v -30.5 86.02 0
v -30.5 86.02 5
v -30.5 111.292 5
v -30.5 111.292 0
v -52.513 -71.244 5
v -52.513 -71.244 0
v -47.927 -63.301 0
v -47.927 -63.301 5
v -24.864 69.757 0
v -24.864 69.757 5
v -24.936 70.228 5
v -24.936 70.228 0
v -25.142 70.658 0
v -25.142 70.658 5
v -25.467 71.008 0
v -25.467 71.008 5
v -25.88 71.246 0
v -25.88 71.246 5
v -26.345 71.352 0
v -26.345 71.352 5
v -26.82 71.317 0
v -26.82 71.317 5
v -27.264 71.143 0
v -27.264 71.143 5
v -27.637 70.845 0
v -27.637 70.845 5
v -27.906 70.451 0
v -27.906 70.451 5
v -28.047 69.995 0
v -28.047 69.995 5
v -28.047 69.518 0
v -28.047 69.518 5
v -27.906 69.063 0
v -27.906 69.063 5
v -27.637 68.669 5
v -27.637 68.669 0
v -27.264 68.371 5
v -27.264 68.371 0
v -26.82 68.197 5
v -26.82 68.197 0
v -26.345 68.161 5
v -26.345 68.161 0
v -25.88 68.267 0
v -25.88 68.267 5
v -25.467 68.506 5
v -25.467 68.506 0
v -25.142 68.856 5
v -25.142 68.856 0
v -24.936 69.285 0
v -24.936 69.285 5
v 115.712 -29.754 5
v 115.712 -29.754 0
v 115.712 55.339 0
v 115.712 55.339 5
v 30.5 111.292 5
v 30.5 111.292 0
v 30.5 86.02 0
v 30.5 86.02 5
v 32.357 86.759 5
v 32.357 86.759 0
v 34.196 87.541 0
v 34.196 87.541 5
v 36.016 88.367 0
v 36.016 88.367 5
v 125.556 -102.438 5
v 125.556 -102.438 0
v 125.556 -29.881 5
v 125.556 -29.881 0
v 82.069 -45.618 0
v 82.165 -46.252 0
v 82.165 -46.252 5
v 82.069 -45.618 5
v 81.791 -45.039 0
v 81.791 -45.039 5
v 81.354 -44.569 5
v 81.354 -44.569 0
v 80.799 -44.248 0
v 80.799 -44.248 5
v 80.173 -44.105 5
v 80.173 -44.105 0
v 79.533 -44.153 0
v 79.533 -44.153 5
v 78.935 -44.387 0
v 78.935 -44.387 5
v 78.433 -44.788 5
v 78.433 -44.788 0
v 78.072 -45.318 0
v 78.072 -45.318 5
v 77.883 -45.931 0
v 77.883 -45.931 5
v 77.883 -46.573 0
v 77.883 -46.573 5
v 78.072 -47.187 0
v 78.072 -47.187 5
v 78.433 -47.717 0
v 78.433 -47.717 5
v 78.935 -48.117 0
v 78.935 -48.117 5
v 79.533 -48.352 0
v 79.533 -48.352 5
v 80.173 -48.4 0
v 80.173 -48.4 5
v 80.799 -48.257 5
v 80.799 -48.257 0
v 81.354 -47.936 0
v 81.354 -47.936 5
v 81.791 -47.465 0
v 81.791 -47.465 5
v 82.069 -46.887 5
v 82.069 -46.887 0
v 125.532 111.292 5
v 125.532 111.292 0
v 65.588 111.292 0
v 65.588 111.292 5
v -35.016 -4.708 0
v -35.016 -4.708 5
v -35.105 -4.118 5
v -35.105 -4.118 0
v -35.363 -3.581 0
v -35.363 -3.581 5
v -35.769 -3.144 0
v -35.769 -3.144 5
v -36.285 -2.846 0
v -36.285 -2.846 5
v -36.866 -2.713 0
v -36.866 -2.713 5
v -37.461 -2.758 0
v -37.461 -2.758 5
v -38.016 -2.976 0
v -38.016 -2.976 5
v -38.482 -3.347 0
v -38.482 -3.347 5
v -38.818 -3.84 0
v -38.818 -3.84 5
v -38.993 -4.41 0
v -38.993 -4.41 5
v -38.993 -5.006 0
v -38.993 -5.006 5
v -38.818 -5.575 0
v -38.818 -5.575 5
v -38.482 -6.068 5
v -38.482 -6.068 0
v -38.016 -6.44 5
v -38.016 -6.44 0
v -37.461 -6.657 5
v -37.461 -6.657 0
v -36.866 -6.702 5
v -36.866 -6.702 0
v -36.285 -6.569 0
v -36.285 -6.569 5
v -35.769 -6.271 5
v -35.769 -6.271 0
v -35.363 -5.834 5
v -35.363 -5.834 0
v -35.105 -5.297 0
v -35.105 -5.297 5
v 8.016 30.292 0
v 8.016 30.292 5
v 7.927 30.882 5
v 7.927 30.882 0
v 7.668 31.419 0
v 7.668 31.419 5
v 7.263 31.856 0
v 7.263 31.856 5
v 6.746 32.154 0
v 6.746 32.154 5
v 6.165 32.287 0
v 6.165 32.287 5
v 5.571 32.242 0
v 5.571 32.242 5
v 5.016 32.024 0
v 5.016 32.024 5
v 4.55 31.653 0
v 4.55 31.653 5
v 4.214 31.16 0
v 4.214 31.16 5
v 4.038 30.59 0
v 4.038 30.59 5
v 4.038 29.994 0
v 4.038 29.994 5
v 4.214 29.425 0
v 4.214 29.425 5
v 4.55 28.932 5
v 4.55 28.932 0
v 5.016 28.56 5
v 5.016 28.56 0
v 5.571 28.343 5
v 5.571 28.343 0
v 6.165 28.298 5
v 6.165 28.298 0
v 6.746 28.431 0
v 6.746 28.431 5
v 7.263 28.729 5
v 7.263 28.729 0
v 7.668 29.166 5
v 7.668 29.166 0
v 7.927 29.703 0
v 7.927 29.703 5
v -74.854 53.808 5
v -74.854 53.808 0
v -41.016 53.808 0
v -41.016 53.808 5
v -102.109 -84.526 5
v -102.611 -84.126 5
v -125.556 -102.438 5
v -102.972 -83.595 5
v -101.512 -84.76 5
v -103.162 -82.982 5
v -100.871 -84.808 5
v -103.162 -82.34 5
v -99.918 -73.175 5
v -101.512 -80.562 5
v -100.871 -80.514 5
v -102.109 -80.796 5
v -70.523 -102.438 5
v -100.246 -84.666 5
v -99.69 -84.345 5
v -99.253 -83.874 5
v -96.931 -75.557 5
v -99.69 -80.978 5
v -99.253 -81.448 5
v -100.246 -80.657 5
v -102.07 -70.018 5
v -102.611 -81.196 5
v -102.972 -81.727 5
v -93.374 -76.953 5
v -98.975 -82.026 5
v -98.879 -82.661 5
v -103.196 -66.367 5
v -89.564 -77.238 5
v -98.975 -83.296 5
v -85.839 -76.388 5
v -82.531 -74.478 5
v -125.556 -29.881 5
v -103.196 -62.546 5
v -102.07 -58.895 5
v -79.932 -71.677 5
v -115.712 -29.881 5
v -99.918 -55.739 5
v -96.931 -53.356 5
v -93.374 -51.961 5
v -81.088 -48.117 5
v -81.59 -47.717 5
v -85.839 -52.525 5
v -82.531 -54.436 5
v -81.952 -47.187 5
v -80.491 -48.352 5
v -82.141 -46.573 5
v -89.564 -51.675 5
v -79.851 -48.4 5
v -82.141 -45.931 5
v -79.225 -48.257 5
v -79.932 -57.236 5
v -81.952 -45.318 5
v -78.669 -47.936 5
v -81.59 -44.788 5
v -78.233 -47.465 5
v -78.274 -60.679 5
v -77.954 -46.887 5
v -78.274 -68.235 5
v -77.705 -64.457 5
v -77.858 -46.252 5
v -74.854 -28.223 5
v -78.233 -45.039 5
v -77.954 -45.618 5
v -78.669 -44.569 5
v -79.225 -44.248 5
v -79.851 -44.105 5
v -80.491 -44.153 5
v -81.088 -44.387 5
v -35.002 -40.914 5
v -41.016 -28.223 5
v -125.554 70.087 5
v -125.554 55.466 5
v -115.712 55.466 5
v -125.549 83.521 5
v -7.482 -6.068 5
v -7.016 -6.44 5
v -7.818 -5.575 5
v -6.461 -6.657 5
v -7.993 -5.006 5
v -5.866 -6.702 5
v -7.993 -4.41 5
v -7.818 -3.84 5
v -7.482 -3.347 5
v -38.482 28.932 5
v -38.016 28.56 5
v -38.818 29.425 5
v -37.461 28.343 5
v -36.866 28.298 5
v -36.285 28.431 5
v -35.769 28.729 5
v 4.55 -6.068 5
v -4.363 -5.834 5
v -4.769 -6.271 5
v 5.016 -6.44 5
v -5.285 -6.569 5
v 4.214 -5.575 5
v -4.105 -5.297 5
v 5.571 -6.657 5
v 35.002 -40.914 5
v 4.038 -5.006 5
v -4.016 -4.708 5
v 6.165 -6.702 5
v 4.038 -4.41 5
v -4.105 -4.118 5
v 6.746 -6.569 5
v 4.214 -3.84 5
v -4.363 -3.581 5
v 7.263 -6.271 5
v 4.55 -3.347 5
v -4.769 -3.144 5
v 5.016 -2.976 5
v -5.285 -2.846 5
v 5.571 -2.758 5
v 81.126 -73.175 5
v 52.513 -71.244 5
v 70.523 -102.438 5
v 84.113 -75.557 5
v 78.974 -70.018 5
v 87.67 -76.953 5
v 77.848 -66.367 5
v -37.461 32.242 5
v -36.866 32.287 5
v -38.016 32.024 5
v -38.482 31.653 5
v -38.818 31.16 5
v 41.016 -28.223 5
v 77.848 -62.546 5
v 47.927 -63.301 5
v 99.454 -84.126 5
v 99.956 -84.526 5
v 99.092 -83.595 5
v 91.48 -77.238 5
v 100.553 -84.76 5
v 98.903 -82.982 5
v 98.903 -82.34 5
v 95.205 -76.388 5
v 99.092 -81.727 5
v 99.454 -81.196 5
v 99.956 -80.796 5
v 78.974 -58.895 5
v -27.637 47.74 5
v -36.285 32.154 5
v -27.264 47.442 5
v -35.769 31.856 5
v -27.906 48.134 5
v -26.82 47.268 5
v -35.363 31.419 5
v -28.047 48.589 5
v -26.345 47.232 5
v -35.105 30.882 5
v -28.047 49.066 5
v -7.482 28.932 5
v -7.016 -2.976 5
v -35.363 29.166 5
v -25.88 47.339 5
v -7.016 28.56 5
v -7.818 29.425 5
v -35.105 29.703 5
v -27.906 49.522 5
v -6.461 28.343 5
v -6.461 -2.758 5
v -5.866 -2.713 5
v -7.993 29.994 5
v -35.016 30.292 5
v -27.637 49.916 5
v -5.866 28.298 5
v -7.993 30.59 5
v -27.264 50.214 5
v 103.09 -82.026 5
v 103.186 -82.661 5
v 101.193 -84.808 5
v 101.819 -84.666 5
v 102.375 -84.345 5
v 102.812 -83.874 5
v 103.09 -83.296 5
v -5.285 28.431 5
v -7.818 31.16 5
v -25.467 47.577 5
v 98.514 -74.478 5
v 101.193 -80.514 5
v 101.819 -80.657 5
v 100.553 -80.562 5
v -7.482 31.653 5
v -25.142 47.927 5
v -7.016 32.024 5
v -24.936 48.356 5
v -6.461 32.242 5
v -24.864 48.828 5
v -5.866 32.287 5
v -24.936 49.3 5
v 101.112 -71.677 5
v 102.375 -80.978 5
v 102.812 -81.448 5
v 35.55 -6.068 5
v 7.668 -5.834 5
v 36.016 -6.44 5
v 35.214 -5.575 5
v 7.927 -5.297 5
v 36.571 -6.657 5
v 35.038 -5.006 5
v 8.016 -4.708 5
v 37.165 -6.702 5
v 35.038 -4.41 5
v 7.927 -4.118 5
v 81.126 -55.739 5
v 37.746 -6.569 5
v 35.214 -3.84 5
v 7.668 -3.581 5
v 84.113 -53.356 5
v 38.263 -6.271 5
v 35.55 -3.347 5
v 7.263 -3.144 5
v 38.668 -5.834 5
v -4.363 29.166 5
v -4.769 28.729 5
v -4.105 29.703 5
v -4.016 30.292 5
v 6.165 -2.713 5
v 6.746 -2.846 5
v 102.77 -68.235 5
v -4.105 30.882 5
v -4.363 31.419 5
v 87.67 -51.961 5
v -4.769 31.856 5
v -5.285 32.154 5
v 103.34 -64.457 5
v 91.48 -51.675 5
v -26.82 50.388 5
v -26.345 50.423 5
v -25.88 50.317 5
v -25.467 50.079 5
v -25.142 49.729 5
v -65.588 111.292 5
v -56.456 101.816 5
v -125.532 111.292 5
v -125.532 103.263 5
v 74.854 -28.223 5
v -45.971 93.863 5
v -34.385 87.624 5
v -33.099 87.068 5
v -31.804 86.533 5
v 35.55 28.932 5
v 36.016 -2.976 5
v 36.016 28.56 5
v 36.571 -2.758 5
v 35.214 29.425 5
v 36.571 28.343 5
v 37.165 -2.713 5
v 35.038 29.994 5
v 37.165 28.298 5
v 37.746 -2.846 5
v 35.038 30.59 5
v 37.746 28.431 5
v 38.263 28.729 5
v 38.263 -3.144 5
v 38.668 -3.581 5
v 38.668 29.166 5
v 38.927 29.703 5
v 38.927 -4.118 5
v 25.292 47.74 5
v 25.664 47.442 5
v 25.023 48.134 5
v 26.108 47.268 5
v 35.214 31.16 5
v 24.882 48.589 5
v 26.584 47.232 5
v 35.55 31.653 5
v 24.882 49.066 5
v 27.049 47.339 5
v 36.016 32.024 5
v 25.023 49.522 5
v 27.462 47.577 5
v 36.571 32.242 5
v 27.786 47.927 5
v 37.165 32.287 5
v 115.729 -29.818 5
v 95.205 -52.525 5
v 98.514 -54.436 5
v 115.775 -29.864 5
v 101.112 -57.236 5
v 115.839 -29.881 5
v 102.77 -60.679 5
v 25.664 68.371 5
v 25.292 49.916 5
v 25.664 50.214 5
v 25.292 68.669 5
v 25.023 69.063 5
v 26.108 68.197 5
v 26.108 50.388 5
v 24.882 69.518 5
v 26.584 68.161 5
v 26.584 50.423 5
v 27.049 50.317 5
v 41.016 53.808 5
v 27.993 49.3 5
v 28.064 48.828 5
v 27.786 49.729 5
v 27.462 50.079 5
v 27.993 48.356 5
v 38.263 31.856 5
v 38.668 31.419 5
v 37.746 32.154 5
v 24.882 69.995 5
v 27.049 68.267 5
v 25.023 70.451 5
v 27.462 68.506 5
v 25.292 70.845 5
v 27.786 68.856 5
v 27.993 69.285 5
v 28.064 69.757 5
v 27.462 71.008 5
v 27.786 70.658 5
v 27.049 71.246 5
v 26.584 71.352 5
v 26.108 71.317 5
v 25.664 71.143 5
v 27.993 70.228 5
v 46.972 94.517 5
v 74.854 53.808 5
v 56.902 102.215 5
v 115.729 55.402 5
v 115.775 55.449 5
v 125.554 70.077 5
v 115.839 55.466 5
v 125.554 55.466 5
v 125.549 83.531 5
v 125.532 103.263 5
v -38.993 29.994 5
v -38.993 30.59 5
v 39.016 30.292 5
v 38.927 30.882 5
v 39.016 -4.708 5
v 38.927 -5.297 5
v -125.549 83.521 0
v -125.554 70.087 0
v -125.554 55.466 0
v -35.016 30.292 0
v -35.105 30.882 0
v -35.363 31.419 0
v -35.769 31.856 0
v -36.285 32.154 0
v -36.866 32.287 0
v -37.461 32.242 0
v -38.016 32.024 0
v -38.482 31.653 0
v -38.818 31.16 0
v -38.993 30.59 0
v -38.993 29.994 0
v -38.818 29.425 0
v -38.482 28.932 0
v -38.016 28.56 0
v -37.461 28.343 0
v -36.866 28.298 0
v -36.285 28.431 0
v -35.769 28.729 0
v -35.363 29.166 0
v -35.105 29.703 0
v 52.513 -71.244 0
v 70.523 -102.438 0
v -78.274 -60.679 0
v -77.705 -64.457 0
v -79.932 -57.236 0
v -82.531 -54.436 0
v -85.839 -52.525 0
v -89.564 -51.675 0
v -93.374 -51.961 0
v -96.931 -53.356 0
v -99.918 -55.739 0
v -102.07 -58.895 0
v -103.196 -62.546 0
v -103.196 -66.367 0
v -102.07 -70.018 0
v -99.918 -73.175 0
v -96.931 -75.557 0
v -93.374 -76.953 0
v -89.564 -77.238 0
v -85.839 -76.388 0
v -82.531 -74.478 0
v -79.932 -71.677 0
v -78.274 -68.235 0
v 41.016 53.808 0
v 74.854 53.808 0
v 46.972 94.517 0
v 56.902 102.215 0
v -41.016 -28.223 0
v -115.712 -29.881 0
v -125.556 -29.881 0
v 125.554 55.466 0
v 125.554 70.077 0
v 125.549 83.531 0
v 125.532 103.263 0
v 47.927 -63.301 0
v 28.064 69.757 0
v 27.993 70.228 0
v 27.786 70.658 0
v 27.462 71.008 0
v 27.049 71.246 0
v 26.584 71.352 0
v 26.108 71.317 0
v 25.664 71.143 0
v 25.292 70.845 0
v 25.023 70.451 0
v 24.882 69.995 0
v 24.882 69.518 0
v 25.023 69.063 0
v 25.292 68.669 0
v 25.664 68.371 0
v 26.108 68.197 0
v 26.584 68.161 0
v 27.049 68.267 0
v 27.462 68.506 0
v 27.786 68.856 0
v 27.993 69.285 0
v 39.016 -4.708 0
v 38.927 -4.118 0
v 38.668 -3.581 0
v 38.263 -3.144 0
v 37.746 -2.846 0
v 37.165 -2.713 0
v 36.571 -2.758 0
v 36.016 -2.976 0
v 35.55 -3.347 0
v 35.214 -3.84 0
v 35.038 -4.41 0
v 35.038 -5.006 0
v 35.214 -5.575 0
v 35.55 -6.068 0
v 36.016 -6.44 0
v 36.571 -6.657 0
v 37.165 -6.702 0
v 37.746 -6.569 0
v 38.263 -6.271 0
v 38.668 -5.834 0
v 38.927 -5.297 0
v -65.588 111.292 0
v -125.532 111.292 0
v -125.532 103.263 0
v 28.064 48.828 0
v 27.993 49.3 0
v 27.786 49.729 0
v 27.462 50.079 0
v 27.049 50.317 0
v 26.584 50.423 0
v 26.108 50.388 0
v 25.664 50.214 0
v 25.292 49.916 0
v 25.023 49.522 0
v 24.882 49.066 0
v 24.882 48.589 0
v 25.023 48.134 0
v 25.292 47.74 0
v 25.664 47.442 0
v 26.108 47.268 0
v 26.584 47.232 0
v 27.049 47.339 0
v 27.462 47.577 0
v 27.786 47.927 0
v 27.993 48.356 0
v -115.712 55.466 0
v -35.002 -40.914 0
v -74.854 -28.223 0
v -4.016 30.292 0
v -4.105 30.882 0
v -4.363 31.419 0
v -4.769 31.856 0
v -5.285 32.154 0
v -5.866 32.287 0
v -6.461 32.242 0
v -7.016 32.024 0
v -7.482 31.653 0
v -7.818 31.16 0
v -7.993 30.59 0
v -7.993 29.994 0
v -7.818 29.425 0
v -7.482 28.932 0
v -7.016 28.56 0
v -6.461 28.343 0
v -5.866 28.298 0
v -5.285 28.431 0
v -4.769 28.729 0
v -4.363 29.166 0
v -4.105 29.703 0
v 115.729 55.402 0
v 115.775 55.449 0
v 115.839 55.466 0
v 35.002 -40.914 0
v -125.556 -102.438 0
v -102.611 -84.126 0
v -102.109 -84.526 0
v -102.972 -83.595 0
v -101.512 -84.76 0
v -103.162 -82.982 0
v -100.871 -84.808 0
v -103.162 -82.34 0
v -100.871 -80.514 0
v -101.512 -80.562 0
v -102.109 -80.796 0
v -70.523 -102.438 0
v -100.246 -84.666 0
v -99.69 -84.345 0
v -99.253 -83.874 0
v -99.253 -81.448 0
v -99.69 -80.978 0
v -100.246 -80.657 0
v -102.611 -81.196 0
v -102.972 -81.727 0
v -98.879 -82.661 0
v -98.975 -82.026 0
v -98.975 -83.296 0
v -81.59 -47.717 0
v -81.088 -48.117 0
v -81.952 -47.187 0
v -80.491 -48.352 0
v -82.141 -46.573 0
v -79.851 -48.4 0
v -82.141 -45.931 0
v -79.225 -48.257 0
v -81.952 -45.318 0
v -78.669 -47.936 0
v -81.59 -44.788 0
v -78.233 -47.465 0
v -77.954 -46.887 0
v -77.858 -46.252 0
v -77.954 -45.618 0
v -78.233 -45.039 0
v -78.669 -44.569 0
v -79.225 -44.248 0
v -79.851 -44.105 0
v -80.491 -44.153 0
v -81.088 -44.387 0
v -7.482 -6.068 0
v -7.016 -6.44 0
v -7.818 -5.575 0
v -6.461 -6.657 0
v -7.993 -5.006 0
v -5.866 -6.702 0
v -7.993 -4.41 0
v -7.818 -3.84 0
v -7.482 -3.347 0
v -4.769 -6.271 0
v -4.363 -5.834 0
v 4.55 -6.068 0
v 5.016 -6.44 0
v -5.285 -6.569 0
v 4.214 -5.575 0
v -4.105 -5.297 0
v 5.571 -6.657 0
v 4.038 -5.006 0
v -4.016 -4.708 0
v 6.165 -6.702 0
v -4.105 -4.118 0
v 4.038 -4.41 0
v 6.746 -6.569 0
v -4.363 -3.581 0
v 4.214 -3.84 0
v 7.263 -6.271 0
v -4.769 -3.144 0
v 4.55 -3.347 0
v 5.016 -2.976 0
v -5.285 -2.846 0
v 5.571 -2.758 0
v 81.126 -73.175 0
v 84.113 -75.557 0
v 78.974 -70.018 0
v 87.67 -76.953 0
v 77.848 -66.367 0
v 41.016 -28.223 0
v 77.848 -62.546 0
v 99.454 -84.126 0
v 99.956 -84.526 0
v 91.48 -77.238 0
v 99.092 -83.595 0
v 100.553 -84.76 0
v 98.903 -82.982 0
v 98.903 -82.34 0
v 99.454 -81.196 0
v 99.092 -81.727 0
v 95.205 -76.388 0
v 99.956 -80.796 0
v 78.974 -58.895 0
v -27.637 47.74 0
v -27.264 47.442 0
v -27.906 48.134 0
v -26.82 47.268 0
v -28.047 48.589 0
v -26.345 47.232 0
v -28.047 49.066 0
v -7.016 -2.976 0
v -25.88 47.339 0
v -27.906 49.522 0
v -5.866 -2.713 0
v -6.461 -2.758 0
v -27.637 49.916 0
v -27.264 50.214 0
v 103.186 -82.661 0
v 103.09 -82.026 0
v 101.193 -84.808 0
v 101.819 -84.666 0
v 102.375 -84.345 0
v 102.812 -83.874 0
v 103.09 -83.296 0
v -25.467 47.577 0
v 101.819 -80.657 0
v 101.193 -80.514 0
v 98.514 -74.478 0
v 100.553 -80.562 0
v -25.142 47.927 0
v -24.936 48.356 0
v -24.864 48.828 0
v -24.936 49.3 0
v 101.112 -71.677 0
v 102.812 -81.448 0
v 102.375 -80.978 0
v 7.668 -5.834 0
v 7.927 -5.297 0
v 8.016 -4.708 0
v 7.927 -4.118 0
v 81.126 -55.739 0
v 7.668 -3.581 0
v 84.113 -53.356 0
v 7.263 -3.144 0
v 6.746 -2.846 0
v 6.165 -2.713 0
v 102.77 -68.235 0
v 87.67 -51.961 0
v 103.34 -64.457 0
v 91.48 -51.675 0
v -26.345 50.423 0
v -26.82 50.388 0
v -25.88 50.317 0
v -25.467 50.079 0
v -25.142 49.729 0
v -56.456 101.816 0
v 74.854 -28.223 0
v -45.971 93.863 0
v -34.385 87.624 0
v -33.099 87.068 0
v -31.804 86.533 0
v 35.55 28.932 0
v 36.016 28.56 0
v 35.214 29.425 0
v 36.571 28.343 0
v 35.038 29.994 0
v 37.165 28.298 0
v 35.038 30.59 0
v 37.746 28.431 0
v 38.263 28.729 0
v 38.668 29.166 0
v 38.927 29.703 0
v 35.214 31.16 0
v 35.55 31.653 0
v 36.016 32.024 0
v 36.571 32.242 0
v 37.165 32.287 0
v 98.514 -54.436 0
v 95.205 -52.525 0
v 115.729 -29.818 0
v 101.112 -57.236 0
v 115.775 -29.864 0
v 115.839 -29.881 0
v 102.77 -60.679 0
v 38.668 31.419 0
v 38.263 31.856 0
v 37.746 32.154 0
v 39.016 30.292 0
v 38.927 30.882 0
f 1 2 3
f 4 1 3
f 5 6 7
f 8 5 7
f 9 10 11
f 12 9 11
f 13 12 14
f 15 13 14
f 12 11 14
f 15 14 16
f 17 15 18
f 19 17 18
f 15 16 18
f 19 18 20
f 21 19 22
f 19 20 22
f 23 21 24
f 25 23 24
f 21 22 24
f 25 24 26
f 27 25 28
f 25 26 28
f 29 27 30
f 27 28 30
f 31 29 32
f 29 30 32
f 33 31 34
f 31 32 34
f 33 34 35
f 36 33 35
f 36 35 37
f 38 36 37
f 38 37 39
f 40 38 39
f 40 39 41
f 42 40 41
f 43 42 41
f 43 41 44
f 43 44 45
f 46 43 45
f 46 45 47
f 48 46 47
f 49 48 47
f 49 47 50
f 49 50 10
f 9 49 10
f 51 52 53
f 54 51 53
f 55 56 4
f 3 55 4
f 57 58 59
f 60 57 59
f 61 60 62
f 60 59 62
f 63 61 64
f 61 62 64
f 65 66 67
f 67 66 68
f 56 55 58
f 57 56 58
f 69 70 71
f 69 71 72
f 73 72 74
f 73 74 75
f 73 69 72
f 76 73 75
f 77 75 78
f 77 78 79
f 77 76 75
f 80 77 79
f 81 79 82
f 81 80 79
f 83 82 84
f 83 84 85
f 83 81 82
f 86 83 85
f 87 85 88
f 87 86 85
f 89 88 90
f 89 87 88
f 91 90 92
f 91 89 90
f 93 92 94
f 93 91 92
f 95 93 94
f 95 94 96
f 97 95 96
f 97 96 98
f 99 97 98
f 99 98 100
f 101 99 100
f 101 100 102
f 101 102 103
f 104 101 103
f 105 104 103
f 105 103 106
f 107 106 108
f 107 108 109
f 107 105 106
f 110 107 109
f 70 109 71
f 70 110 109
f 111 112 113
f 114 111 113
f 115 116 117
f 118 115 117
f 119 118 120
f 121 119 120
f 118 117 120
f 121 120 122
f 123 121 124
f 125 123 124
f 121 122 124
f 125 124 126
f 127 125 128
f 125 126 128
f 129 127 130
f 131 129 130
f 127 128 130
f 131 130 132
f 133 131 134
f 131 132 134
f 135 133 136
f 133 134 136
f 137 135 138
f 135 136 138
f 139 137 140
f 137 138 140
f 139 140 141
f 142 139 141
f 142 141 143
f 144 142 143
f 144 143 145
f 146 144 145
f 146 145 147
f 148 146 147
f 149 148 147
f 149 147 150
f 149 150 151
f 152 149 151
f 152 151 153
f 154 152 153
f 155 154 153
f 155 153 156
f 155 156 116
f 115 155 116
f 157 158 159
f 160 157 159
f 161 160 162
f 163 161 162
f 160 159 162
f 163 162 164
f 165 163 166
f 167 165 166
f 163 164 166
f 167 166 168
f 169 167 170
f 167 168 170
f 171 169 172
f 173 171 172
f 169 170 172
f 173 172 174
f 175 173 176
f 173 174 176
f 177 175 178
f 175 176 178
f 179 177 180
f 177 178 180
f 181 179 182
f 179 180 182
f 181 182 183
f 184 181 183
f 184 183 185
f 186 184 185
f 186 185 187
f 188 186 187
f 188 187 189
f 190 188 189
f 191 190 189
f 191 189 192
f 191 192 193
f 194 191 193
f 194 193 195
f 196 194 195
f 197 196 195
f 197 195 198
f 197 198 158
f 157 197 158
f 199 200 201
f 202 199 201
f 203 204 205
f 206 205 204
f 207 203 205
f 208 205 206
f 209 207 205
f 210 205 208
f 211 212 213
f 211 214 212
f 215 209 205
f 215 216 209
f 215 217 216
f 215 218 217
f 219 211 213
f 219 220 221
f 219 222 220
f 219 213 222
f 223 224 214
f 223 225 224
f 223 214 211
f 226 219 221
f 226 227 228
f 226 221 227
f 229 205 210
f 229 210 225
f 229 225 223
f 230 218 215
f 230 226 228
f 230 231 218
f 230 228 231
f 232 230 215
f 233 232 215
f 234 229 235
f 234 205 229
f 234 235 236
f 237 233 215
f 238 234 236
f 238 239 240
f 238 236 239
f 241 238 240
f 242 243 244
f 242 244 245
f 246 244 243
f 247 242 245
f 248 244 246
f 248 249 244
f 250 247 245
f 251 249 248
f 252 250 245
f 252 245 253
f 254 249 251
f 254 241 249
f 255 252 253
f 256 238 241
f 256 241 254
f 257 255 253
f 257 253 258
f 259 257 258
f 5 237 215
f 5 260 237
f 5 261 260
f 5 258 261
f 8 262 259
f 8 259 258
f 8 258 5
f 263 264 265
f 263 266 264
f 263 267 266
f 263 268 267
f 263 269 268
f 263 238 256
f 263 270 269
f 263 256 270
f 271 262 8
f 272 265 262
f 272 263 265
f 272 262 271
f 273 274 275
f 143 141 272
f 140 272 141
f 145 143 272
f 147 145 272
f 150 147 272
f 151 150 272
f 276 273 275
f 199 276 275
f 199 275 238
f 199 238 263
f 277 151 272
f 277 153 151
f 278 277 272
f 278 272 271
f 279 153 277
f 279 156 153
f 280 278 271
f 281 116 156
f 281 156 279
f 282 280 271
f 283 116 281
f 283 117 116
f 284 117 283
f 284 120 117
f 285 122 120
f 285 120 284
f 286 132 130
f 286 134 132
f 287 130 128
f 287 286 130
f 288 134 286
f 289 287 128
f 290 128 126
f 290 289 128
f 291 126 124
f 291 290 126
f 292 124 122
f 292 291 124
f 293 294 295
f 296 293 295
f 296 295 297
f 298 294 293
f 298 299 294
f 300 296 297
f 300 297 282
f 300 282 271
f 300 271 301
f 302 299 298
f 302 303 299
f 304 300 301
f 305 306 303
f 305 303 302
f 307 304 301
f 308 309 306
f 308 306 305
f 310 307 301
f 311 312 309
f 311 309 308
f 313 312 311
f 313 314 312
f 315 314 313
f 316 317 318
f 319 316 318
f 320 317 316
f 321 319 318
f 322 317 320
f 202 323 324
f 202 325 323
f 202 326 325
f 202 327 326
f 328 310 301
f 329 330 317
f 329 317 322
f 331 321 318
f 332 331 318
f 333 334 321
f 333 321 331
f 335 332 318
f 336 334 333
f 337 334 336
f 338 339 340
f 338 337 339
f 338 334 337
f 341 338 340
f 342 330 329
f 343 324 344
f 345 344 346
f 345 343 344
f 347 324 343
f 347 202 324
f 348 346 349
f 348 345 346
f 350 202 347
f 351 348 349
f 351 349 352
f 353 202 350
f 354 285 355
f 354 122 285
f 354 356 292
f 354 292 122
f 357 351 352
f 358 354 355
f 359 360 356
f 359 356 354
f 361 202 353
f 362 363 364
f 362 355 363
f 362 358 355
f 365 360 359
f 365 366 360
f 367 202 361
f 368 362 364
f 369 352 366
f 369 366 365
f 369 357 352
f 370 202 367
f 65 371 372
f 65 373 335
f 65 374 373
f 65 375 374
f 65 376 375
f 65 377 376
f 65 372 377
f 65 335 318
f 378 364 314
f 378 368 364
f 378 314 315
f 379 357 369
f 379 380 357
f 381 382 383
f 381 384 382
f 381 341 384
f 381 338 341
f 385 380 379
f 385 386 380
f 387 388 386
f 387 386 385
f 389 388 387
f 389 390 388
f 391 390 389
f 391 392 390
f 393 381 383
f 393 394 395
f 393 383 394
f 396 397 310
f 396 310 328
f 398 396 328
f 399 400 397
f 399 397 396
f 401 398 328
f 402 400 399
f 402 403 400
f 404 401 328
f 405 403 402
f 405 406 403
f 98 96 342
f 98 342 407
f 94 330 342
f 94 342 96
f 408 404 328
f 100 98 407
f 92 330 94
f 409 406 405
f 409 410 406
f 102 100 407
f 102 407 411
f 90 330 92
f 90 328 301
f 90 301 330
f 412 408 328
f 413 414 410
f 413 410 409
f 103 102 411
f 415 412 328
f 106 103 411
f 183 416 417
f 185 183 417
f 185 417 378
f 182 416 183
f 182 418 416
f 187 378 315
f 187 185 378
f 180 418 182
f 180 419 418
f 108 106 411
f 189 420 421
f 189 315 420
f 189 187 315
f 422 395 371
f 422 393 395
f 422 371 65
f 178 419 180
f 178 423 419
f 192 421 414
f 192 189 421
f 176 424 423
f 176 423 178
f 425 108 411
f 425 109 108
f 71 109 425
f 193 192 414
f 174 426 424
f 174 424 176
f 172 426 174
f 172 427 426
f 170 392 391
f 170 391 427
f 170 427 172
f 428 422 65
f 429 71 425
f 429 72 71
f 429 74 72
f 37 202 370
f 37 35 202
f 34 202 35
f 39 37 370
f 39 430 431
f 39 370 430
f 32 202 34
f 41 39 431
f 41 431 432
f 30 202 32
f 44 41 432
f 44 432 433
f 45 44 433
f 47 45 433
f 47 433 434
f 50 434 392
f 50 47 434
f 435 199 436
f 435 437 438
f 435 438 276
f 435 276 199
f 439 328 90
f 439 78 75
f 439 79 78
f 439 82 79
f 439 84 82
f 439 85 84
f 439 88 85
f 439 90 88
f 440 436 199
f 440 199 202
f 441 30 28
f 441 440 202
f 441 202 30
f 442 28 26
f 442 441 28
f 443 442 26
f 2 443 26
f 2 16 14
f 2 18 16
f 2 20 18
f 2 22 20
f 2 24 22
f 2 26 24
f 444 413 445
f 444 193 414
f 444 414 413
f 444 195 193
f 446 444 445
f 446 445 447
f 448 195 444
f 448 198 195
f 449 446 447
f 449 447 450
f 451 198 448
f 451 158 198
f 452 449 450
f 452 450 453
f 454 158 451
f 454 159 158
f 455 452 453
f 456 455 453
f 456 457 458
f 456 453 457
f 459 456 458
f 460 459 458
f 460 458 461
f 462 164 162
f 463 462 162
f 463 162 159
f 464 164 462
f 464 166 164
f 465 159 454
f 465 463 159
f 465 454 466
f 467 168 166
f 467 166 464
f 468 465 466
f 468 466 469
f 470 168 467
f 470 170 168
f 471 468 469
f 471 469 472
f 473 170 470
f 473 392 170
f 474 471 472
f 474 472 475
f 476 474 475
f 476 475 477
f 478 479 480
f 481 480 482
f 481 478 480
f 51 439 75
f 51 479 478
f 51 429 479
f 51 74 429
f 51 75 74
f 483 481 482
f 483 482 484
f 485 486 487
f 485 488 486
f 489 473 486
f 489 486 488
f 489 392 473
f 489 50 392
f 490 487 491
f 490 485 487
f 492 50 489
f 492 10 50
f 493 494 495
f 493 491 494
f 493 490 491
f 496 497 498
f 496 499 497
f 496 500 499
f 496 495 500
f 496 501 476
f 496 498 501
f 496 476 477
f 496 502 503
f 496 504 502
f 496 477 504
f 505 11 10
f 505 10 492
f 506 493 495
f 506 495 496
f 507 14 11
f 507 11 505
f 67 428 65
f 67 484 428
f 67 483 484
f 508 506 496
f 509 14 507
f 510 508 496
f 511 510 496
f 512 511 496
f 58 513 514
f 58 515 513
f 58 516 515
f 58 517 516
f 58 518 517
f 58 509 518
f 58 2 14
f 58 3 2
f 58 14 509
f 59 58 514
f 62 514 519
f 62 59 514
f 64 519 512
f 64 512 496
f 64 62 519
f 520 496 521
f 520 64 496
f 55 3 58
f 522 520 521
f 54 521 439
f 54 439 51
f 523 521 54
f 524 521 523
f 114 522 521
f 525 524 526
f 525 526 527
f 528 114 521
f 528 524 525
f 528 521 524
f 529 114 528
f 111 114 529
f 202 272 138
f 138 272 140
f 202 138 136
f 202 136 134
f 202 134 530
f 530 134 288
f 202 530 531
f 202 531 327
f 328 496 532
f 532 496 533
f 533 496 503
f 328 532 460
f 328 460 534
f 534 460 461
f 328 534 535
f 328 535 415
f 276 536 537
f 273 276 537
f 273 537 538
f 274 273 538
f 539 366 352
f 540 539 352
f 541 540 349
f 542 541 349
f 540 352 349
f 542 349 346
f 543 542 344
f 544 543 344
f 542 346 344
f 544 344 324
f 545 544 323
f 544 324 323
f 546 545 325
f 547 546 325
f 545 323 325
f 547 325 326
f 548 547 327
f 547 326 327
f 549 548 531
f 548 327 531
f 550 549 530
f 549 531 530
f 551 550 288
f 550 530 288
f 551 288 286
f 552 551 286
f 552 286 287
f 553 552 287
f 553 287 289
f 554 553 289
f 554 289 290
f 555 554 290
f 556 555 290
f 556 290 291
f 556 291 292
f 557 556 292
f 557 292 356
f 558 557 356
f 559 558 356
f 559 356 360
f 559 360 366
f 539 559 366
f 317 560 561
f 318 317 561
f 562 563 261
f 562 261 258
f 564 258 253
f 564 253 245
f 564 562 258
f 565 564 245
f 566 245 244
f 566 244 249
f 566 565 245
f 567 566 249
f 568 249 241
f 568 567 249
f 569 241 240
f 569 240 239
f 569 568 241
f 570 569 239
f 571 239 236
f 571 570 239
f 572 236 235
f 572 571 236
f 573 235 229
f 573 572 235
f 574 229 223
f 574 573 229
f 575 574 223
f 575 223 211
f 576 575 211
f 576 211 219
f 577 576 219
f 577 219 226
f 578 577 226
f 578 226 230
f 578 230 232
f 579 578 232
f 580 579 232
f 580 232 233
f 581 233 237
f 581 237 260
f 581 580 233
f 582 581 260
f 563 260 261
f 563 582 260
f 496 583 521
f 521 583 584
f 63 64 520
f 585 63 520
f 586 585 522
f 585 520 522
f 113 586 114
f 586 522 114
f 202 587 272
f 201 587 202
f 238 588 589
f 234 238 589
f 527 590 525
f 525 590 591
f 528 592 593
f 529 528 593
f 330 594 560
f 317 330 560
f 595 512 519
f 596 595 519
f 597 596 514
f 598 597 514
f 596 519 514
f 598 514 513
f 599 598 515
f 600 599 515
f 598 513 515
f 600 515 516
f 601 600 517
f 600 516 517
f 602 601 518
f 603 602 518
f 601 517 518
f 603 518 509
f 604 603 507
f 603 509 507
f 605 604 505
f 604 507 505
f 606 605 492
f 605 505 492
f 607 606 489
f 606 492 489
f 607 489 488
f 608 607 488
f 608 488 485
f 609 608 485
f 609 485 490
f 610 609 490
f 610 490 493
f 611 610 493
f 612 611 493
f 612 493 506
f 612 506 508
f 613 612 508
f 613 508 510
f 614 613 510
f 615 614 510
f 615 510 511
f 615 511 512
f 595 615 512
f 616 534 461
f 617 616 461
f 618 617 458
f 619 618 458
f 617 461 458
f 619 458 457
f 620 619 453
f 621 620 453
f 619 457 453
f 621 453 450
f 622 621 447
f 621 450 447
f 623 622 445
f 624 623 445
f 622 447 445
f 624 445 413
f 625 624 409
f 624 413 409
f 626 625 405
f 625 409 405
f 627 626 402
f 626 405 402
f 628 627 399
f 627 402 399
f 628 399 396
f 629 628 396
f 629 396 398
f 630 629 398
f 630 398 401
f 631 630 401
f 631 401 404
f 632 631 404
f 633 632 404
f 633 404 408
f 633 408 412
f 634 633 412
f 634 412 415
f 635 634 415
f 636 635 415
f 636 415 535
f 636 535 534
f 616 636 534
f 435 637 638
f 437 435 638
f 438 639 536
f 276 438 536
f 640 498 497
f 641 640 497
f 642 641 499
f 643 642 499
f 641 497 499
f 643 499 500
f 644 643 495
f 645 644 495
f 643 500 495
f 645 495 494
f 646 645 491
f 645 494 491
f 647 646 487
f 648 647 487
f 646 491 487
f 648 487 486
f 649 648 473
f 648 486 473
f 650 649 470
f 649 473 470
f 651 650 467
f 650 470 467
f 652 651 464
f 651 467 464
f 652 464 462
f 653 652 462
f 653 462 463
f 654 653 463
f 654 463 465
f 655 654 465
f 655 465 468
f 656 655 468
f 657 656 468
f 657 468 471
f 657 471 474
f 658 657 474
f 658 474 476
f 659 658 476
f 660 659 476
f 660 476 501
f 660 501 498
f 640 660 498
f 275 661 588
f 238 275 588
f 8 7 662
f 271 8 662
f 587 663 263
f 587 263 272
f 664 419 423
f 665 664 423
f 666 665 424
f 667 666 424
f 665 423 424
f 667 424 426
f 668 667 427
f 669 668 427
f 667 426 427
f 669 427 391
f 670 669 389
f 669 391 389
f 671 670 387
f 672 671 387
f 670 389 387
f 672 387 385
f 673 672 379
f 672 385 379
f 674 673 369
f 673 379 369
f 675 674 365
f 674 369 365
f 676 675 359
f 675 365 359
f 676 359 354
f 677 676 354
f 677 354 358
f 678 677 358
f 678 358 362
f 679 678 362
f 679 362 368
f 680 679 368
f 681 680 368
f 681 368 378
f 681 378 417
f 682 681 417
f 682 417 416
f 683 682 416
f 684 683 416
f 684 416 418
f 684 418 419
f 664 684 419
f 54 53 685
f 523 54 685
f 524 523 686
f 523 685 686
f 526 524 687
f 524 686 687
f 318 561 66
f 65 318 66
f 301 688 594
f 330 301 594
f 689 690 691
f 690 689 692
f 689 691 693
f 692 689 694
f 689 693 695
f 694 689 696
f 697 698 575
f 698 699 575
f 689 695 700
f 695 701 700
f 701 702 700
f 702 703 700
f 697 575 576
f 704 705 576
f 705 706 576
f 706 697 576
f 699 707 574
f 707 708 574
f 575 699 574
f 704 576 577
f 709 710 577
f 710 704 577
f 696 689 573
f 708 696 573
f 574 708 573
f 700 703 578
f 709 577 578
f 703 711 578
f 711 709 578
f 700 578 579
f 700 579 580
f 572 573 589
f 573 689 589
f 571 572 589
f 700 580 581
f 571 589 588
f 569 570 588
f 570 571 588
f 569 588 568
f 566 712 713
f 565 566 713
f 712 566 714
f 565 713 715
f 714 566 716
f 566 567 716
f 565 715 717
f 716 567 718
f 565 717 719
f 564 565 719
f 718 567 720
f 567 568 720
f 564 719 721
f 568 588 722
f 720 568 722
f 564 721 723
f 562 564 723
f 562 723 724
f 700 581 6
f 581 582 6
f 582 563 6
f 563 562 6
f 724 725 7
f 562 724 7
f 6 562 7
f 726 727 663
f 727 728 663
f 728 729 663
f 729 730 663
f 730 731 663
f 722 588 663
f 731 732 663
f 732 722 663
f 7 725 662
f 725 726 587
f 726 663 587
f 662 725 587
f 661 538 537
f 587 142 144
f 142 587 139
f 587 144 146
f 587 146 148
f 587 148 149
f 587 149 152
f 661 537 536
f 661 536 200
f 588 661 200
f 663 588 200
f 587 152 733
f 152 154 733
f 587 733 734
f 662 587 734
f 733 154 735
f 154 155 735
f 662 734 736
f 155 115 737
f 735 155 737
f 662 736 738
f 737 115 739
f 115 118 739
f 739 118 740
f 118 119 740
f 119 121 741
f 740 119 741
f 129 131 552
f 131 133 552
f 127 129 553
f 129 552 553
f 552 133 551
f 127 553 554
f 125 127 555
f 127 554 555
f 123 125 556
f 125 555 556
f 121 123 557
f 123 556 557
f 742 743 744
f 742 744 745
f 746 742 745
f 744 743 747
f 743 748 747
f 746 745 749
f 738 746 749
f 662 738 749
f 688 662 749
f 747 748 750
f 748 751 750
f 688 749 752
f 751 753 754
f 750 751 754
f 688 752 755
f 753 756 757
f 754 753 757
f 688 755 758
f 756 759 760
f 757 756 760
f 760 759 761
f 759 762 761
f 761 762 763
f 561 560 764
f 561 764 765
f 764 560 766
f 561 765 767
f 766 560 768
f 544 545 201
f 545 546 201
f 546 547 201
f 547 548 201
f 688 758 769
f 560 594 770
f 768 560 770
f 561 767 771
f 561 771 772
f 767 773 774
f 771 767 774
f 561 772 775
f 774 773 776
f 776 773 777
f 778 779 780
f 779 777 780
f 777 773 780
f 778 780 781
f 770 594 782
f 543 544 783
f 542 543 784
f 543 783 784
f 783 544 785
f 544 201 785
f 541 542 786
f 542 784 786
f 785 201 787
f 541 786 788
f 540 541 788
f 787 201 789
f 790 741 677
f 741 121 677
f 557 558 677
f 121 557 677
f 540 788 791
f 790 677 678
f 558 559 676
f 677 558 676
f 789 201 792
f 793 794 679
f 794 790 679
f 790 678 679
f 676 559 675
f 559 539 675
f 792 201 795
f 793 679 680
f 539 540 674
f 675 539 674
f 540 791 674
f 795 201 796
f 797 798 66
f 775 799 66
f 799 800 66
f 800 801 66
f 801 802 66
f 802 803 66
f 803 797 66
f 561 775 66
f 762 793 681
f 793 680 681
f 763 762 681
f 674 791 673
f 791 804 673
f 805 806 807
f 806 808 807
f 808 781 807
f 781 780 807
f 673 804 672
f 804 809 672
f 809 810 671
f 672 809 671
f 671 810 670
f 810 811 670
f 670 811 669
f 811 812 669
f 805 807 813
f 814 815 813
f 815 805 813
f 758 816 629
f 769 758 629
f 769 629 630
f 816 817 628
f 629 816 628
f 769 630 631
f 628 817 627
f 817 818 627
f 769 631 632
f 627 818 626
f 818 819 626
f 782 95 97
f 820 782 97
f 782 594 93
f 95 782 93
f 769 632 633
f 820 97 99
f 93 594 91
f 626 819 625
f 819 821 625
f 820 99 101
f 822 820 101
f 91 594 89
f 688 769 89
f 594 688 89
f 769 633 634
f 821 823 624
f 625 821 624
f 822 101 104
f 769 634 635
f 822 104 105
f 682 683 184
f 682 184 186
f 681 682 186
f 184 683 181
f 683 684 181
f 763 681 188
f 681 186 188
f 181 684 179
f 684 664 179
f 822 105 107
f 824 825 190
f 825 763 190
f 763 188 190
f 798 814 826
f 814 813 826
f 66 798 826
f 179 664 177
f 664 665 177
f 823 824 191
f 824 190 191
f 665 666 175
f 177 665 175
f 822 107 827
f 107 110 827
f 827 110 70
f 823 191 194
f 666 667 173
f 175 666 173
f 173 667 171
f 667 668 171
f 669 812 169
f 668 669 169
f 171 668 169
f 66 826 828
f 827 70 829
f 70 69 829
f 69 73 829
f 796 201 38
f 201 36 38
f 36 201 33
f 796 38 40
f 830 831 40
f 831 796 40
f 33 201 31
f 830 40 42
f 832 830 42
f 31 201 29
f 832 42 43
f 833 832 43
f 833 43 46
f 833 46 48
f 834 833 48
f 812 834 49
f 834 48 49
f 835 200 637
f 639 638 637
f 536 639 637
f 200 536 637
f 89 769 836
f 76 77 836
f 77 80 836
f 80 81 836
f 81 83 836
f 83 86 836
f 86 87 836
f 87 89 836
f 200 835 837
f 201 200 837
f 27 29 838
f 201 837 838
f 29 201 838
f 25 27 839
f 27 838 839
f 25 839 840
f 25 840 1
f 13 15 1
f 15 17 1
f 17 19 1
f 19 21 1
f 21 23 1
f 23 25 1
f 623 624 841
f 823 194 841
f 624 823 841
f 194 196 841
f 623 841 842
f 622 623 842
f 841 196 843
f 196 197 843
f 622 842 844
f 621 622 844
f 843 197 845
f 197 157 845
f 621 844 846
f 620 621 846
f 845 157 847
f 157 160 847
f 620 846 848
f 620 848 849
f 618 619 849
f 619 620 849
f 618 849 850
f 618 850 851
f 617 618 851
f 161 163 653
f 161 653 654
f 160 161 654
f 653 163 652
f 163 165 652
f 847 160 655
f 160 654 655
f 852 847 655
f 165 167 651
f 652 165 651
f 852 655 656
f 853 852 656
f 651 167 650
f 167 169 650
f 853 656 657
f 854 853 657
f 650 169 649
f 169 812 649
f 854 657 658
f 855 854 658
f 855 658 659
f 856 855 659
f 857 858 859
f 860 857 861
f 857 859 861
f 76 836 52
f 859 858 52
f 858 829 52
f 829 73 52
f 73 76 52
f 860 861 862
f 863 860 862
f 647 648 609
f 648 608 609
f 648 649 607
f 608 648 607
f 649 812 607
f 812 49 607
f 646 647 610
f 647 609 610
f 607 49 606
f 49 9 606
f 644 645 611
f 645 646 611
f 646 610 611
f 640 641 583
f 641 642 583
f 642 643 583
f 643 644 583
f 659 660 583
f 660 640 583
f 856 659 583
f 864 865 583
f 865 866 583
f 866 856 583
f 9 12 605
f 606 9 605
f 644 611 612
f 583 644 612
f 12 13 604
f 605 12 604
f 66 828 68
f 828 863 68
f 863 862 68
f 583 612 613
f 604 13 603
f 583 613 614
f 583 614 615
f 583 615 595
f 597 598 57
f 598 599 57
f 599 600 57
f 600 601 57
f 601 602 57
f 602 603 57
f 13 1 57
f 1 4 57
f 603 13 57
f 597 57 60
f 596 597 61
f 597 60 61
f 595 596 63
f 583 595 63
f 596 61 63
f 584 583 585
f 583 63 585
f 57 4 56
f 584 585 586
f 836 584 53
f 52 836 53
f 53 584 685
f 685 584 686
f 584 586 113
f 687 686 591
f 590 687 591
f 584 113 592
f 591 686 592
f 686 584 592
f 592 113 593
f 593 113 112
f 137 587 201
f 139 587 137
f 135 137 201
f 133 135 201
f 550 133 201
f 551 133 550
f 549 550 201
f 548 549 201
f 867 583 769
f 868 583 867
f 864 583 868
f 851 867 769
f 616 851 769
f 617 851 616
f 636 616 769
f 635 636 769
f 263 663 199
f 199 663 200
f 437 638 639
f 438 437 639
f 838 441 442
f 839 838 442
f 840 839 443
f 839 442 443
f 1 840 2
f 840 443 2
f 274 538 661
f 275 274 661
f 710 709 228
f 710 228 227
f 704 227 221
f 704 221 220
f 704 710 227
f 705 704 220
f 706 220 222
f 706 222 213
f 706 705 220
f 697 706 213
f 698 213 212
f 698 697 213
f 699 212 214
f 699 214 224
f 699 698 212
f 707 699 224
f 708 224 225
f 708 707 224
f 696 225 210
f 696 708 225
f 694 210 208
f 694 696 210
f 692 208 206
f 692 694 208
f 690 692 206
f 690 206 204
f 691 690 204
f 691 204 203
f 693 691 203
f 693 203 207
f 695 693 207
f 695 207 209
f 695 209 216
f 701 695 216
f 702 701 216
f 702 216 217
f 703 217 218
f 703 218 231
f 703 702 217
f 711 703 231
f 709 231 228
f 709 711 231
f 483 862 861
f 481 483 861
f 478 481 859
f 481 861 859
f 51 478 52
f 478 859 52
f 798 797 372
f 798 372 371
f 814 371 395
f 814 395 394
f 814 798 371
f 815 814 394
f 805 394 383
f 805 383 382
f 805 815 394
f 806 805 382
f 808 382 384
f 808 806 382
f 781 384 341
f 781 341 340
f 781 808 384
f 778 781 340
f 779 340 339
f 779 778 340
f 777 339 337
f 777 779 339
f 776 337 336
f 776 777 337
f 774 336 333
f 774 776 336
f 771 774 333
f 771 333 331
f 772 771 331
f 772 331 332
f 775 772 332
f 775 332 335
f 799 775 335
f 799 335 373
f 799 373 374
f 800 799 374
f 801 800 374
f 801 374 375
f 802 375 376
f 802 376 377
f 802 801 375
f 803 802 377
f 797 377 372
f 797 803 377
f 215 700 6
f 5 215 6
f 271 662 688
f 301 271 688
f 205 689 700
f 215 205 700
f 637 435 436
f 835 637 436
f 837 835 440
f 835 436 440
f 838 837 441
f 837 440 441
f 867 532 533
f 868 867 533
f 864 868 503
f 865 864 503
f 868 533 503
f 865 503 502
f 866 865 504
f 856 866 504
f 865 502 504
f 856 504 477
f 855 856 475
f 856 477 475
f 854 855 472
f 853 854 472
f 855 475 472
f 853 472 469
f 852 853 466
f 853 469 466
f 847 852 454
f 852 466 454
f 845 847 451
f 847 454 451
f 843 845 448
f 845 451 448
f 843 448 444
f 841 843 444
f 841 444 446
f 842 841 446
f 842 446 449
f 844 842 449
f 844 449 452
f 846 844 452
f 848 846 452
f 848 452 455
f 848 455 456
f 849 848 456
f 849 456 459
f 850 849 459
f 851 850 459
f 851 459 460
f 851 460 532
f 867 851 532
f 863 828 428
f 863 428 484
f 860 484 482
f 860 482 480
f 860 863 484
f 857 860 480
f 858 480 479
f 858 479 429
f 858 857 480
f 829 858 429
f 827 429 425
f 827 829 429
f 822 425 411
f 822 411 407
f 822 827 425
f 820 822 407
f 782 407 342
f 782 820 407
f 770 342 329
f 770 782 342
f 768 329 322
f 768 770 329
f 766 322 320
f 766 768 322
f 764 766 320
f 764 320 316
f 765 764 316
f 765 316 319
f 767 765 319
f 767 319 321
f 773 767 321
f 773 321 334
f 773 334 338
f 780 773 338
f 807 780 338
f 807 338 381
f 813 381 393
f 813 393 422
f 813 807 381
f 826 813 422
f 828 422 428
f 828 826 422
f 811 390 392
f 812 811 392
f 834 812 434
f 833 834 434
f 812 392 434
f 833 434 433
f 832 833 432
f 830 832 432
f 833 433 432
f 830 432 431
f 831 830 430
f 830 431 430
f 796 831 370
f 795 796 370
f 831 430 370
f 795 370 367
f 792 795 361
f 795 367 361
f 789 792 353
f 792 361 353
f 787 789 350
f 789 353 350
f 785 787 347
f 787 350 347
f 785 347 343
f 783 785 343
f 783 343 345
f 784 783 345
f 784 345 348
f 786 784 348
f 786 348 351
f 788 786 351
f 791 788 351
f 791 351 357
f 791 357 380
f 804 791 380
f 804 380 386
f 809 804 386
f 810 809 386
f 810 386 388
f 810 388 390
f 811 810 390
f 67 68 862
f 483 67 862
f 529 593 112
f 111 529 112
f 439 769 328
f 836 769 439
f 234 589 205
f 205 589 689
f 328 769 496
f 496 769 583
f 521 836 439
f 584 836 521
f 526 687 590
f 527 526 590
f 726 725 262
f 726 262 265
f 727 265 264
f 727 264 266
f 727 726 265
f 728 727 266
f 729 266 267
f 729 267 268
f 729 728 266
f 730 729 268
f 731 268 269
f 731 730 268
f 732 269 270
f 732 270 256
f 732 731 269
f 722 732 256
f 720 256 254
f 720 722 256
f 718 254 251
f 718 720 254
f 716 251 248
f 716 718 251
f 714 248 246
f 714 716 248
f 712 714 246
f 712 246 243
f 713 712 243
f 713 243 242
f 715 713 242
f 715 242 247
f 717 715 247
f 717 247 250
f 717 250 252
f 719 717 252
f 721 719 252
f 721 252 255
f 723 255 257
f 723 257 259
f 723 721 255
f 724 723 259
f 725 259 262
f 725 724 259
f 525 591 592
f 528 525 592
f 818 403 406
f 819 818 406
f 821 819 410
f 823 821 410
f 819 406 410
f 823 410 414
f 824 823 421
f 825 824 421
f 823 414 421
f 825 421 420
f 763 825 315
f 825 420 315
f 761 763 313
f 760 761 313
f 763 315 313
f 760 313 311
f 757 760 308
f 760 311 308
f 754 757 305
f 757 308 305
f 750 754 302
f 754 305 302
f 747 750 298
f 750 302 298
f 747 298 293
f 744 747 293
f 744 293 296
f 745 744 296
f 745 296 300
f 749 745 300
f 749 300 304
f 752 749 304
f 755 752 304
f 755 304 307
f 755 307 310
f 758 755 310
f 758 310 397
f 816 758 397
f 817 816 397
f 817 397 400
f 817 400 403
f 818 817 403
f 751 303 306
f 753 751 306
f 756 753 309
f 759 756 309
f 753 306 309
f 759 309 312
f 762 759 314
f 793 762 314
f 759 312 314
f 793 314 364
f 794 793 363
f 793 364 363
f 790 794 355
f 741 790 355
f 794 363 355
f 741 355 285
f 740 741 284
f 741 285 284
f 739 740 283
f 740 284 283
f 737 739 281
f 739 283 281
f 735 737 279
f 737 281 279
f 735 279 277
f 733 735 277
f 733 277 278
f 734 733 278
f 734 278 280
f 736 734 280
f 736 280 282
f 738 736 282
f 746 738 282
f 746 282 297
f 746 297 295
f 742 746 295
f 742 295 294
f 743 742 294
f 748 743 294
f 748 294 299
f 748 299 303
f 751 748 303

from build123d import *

# Parameters (mm, degrees)
SKETCH1_R           = 2.153330351
SKETCH1_R_2         = 12.817442563
SKETCH1_W           = 33.838048367
SKETCH1_H           = 82.031632405
BOSS_EXTRUDE1_DEPTH = 5
SKETCH5_R           = 62
CUT_EXTRUDE3_DEPTH  = 5
SKETCH6_R           = 1.6
SKETCH6_R_2         = 2
CUT_EXTRUDE4_DEPTH  = 10
BOSS_EXTRUDE2_DEPTH = 5
CUT_EXTRUDE5_DEPTH  = 30


with BuildPart() as part:
    # Sketch1 → Boss-Extrude1 (new body)
    with BuildSketch(Plane.XY):
        with BuildLine():
            Line((125.53231807, 103.262634184), (91.381905468, 103.262634184))
            Line((91.381905468, 103.262634184), (77.913526918, 103.262634184))
            Line((77.913526918, 103.262634184), (36.253297751, 103.262634184))
            ThreePointArc((36.253297751, 103.262634184), (0, 93.454499378), (-36.253297751, 103.262634184))
            Line((-36.253297751, 103.262634184), (-77.913526918, 103.262634184))
            Line((-77.913526918, 103.262634184), (-91.381905468, 103.262634184))
            Line((-91.381905468, 103.262634184), (-125.53231807, 103.262634184))
            Line((-125.53231807, 103.262634184), (-125.54905558, 83.520799446))
            Line((-125.54905558, 83.520799446), (-125.554160174, 70.087177042))
            Line((-125.554160174, 70.087177042), (-125.554470078, 55.465919402))
            Line((-125.554470078, 55.465919402), (-115.83891891, 55.465919402))
            Line((-115.83891891, 55.465919402), (-115.711941884, 55.465919402))
            Line((-115.711941884, 55.465919402), (-115.711941884, 55.338942376))
            Line((-115.711941884, 55.338942376), (-115.711941884, -29.754151955))
            Line((-115.711941884, -29.754151955), (-115.711941884, -29.88112898))
            Line((-115.711941884, -29.88112898), (-115.83891891, -29.88112898))
            Line((-115.83891891, -29.88112898), (-125.555737773, -29.88112898))
            Line((-125.555737773, -29.88112898), (-125.555737773, -59.42445768))
            Line((-125.555737773, -59.42445768), (-125.555737773, -72.892836229))
            Line((-125.555737773, -72.892836229), (-125.555737773, -102.437610833))
            Line((-125.555737773, -102.437610833), (-101.198740966, -102.437610833))
            Line((-101.198740966, -102.437610833), (-87.730362416, -102.437610833))
            Line((-87.730362416, -102.437610833), (-70.522775483, -102.437610833))
            Line((-70.522775483, -102.437610833), (-52.513332124, -71.244339919))
            Line((-52.513332124, -71.244339919), (-47.927289793, -63.301081597))
            Line((-47.927289793, -63.301081597), (-35.002036695, -40.91388653))
            Line((-35.002036695, -40.91388653), (-5.325262411, -40.91388653))
            Line((-5.325262411, -40.91388653), (5.324834587, -40.91388653))
            Line((5.324834587, -40.91388653), (35.002036695, -40.91388653))
            Line((35.002036695, -40.91388653), (47.927289793, -63.301081597))
            Line((47.927289793, -63.301081597), (52.513332124, -71.244339919))
            Line((52.513332124, -71.244339919), (70.522775483, -102.437610833))
            Line((70.522775483, -102.437610833), (87.730362416, -102.437610833))
            Line((87.730362416, -102.437610833), (101.198740966, -102.437610833))
            Line((101.198740966, -102.437610833), (125.555737773, -102.437610833))
            Line((125.555737773, -102.437610833), (125.555737773, -72.892113277))
            Line((125.555737773, -72.892113277), (125.555737773, -59.423734727))
            Line((125.555737773, -59.423734727), (125.555737773, -29.88112898))
            Line((125.555737773, -29.88112898), (115.83891891, -29.88112898))
            ThreePointArc((115.83891891, -29.88112898), (115.749132594, -29.843938271), (115.711941884, -29.754151955))
            Line((115.711941884, -29.754151955), (115.711941884, 55.338942376))
            ThreePointArc((115.711941884, 55.338942376), (115.749132594, 55.428728692), (115.83891891, 55.465919402))
            Line((115.83891891, 55.465919402), (125.554470078, 55.465919402))
            Line((125.554470078, 55.465919402), (125.554160387, 70.077114789))
            Line((125.554160387, 70.077114789), (125.549047054, 83.530856147))
            Line((125.549047054, 83.530856147), (125.53231807, 103.262634184))
        make_face()
        with Locations((-101.032414216, -82.661089892)):
            Circle(SKETCH1_R, mode=Mode.SUBTRACT)
        with Locations((-90.522111314, -64.456711263)):
            Circle(SKETCH1_R_2, mode=Mode.SUBTRACT)
        with Locations((-80.011808412, -46.252332635)):
            Circle(SKETCH1_R, mode=Mode.SUBTRACT)
        with Locations((80.011808412, -46.252332635)):
            Circle(SKETCH1_R, mode=Mode.SUBTRACT)
        with Locations((90.522111314, -64.456711263)):
            Circle(SKETCH1_R_2, mode=Mode.SUBTRACT)
        with Locations((101.032414216, -82.661089892)):
            Circle(SKETCH1_R, mode=Mode.SUBTRACT)
        with Locations((57.934840386, 12.792395211)):
            Rectangle(SKETCH1_W, SKETCH1_H, mode=Mode.SUBTRACT)
        with Locations((-57.934840386, 12.792395211)):
            Rectangle(SKETCH1_W, SKETCH1_H, mode=Mode.SUBTRACT)
    extrude(amount=BOSS_EXTRUDE1_DEPTH)

    # Sketch5 → Cut-Extrude3 (cut)
    with BuildSketch(Plane.XY.offset(5)):
        with Locations((0, 135.292395211)):
            Circle(SKETCH5_R)
    extrude(amount=-CUT_EXTRUDE3_DEPTH, mode=Mode.SUBTRACT)

    # Sketch6 → Cut-Extrude4 (cut)
    with BuildSketch(Plane.XY.offset(5)):
        with Locations((26.464466094, 69.756861305)):
            Circle(SKETCH6_R)
        with Locations((26.464466094, 48.827929116)):
            Circle(SKETCH6_R)
        with Locations((-26.464466094, 69.756861305)):
            Circle(SKETCH6_R)
        with Locations((-26.464466094, 48.827929116)):
            Circle(SKETCH6_R)
        with Locations((-37.015816202, 30.292395211)):
            Circle(SKETCH6_R_2)
        with Locations((-37.015816202, -4.707604789)):
            Circle(SKETCH6_R_2)
        with Locations((-6.015816202, -4.707604789)):
            Circle(SKETCH6_R_2)
        with Locations((-6.015816202, 30.292395211)):
            Circle(SKETCH6_R_2)
        with Locations((6.015816202, 30.292395211)):
            Circle(SKETCH6_R_2)
        with Locations((6.015816202, -4.707604789)):
            Circle(SKETCH6_R_2)
        with Locations((37.015816202, 30.292395211)):
            Circle(SKETCH6_R_2)
        with Locations((37.015816202, -4.707604789)):
            Circle(SKETCH6_R_2)
    extrude(amount=-CUT_EXTRUDE4_DEPTH, mode=Mode.SUBTRACT)

    # Sketch8 → Boss-Extrude2 (add)
    with BuildSketch(Plane(origin=(0, 0, 0), x_dir=(-1, 0, 0), z_dir=(0, 0, -1))):
        with BuildLine():
            Line((-125.53231807, 103.262634184), (-125.53231807, 111.292395211))
            Line((-125.53231807, 111.292395211), (125.53231807, 111.292395211))
            Line((125.53231807, 111.292395211), (125.53231807, 103.262634184))
            Line((125.53231807, 103.262634184), (53.085726976, 103.262634184))
            ThreePointArc((53.085726976, 103.262634184), (0, 73.292395211), (-53.085726976, 103.262634184))
            Line((-53.085726976, 103.262634184), (-125.53231807, 103.262634184))
        make_face()
    extrude(amount=-BOSS_EXTRUDE2_DEPTH)

    # Sketch10 → Cut-Extrude5 (cut)
    with BuildSketch(Plane.XY.offset(5)):
        with BuildLine():
            Line((-30.5, 111.292395211), (-65.587998232, 111.292395211))
            ThreePointArc((-65.587998232, 111.292395211), (-51.367987693, 97.636707664), (-34.384510932, 87.624314384))
            ThreePointArc((-34.384510932, 87.624314384), (-32.452174676, 86.797991587), (-30.5, 86.01969421))
            Line((-30.5, 86.01969421), (-30.5, 111.292395211))
        make_face()
        with BuildLine():
            Line((65.587998232, 111.292395211), (30.5, 111.292395211))
            Line((30.5, 111.292395211), (30.5, 86.01969421))
            ThreePointArc((30.5, 86.01969421), (33.278602522, 87.144484688), (36.015816202, 88.366551325))
            ThreePointArc((36.015816202, 88.366551325), (52.079097115, 98.182018442), (65.587998232, 111.292395211))
        make_face()
    extrude(amount=-CUT_EXTRUDE5_DEPTH, mode=Mode.SUBTRACT)


solid = part.part
